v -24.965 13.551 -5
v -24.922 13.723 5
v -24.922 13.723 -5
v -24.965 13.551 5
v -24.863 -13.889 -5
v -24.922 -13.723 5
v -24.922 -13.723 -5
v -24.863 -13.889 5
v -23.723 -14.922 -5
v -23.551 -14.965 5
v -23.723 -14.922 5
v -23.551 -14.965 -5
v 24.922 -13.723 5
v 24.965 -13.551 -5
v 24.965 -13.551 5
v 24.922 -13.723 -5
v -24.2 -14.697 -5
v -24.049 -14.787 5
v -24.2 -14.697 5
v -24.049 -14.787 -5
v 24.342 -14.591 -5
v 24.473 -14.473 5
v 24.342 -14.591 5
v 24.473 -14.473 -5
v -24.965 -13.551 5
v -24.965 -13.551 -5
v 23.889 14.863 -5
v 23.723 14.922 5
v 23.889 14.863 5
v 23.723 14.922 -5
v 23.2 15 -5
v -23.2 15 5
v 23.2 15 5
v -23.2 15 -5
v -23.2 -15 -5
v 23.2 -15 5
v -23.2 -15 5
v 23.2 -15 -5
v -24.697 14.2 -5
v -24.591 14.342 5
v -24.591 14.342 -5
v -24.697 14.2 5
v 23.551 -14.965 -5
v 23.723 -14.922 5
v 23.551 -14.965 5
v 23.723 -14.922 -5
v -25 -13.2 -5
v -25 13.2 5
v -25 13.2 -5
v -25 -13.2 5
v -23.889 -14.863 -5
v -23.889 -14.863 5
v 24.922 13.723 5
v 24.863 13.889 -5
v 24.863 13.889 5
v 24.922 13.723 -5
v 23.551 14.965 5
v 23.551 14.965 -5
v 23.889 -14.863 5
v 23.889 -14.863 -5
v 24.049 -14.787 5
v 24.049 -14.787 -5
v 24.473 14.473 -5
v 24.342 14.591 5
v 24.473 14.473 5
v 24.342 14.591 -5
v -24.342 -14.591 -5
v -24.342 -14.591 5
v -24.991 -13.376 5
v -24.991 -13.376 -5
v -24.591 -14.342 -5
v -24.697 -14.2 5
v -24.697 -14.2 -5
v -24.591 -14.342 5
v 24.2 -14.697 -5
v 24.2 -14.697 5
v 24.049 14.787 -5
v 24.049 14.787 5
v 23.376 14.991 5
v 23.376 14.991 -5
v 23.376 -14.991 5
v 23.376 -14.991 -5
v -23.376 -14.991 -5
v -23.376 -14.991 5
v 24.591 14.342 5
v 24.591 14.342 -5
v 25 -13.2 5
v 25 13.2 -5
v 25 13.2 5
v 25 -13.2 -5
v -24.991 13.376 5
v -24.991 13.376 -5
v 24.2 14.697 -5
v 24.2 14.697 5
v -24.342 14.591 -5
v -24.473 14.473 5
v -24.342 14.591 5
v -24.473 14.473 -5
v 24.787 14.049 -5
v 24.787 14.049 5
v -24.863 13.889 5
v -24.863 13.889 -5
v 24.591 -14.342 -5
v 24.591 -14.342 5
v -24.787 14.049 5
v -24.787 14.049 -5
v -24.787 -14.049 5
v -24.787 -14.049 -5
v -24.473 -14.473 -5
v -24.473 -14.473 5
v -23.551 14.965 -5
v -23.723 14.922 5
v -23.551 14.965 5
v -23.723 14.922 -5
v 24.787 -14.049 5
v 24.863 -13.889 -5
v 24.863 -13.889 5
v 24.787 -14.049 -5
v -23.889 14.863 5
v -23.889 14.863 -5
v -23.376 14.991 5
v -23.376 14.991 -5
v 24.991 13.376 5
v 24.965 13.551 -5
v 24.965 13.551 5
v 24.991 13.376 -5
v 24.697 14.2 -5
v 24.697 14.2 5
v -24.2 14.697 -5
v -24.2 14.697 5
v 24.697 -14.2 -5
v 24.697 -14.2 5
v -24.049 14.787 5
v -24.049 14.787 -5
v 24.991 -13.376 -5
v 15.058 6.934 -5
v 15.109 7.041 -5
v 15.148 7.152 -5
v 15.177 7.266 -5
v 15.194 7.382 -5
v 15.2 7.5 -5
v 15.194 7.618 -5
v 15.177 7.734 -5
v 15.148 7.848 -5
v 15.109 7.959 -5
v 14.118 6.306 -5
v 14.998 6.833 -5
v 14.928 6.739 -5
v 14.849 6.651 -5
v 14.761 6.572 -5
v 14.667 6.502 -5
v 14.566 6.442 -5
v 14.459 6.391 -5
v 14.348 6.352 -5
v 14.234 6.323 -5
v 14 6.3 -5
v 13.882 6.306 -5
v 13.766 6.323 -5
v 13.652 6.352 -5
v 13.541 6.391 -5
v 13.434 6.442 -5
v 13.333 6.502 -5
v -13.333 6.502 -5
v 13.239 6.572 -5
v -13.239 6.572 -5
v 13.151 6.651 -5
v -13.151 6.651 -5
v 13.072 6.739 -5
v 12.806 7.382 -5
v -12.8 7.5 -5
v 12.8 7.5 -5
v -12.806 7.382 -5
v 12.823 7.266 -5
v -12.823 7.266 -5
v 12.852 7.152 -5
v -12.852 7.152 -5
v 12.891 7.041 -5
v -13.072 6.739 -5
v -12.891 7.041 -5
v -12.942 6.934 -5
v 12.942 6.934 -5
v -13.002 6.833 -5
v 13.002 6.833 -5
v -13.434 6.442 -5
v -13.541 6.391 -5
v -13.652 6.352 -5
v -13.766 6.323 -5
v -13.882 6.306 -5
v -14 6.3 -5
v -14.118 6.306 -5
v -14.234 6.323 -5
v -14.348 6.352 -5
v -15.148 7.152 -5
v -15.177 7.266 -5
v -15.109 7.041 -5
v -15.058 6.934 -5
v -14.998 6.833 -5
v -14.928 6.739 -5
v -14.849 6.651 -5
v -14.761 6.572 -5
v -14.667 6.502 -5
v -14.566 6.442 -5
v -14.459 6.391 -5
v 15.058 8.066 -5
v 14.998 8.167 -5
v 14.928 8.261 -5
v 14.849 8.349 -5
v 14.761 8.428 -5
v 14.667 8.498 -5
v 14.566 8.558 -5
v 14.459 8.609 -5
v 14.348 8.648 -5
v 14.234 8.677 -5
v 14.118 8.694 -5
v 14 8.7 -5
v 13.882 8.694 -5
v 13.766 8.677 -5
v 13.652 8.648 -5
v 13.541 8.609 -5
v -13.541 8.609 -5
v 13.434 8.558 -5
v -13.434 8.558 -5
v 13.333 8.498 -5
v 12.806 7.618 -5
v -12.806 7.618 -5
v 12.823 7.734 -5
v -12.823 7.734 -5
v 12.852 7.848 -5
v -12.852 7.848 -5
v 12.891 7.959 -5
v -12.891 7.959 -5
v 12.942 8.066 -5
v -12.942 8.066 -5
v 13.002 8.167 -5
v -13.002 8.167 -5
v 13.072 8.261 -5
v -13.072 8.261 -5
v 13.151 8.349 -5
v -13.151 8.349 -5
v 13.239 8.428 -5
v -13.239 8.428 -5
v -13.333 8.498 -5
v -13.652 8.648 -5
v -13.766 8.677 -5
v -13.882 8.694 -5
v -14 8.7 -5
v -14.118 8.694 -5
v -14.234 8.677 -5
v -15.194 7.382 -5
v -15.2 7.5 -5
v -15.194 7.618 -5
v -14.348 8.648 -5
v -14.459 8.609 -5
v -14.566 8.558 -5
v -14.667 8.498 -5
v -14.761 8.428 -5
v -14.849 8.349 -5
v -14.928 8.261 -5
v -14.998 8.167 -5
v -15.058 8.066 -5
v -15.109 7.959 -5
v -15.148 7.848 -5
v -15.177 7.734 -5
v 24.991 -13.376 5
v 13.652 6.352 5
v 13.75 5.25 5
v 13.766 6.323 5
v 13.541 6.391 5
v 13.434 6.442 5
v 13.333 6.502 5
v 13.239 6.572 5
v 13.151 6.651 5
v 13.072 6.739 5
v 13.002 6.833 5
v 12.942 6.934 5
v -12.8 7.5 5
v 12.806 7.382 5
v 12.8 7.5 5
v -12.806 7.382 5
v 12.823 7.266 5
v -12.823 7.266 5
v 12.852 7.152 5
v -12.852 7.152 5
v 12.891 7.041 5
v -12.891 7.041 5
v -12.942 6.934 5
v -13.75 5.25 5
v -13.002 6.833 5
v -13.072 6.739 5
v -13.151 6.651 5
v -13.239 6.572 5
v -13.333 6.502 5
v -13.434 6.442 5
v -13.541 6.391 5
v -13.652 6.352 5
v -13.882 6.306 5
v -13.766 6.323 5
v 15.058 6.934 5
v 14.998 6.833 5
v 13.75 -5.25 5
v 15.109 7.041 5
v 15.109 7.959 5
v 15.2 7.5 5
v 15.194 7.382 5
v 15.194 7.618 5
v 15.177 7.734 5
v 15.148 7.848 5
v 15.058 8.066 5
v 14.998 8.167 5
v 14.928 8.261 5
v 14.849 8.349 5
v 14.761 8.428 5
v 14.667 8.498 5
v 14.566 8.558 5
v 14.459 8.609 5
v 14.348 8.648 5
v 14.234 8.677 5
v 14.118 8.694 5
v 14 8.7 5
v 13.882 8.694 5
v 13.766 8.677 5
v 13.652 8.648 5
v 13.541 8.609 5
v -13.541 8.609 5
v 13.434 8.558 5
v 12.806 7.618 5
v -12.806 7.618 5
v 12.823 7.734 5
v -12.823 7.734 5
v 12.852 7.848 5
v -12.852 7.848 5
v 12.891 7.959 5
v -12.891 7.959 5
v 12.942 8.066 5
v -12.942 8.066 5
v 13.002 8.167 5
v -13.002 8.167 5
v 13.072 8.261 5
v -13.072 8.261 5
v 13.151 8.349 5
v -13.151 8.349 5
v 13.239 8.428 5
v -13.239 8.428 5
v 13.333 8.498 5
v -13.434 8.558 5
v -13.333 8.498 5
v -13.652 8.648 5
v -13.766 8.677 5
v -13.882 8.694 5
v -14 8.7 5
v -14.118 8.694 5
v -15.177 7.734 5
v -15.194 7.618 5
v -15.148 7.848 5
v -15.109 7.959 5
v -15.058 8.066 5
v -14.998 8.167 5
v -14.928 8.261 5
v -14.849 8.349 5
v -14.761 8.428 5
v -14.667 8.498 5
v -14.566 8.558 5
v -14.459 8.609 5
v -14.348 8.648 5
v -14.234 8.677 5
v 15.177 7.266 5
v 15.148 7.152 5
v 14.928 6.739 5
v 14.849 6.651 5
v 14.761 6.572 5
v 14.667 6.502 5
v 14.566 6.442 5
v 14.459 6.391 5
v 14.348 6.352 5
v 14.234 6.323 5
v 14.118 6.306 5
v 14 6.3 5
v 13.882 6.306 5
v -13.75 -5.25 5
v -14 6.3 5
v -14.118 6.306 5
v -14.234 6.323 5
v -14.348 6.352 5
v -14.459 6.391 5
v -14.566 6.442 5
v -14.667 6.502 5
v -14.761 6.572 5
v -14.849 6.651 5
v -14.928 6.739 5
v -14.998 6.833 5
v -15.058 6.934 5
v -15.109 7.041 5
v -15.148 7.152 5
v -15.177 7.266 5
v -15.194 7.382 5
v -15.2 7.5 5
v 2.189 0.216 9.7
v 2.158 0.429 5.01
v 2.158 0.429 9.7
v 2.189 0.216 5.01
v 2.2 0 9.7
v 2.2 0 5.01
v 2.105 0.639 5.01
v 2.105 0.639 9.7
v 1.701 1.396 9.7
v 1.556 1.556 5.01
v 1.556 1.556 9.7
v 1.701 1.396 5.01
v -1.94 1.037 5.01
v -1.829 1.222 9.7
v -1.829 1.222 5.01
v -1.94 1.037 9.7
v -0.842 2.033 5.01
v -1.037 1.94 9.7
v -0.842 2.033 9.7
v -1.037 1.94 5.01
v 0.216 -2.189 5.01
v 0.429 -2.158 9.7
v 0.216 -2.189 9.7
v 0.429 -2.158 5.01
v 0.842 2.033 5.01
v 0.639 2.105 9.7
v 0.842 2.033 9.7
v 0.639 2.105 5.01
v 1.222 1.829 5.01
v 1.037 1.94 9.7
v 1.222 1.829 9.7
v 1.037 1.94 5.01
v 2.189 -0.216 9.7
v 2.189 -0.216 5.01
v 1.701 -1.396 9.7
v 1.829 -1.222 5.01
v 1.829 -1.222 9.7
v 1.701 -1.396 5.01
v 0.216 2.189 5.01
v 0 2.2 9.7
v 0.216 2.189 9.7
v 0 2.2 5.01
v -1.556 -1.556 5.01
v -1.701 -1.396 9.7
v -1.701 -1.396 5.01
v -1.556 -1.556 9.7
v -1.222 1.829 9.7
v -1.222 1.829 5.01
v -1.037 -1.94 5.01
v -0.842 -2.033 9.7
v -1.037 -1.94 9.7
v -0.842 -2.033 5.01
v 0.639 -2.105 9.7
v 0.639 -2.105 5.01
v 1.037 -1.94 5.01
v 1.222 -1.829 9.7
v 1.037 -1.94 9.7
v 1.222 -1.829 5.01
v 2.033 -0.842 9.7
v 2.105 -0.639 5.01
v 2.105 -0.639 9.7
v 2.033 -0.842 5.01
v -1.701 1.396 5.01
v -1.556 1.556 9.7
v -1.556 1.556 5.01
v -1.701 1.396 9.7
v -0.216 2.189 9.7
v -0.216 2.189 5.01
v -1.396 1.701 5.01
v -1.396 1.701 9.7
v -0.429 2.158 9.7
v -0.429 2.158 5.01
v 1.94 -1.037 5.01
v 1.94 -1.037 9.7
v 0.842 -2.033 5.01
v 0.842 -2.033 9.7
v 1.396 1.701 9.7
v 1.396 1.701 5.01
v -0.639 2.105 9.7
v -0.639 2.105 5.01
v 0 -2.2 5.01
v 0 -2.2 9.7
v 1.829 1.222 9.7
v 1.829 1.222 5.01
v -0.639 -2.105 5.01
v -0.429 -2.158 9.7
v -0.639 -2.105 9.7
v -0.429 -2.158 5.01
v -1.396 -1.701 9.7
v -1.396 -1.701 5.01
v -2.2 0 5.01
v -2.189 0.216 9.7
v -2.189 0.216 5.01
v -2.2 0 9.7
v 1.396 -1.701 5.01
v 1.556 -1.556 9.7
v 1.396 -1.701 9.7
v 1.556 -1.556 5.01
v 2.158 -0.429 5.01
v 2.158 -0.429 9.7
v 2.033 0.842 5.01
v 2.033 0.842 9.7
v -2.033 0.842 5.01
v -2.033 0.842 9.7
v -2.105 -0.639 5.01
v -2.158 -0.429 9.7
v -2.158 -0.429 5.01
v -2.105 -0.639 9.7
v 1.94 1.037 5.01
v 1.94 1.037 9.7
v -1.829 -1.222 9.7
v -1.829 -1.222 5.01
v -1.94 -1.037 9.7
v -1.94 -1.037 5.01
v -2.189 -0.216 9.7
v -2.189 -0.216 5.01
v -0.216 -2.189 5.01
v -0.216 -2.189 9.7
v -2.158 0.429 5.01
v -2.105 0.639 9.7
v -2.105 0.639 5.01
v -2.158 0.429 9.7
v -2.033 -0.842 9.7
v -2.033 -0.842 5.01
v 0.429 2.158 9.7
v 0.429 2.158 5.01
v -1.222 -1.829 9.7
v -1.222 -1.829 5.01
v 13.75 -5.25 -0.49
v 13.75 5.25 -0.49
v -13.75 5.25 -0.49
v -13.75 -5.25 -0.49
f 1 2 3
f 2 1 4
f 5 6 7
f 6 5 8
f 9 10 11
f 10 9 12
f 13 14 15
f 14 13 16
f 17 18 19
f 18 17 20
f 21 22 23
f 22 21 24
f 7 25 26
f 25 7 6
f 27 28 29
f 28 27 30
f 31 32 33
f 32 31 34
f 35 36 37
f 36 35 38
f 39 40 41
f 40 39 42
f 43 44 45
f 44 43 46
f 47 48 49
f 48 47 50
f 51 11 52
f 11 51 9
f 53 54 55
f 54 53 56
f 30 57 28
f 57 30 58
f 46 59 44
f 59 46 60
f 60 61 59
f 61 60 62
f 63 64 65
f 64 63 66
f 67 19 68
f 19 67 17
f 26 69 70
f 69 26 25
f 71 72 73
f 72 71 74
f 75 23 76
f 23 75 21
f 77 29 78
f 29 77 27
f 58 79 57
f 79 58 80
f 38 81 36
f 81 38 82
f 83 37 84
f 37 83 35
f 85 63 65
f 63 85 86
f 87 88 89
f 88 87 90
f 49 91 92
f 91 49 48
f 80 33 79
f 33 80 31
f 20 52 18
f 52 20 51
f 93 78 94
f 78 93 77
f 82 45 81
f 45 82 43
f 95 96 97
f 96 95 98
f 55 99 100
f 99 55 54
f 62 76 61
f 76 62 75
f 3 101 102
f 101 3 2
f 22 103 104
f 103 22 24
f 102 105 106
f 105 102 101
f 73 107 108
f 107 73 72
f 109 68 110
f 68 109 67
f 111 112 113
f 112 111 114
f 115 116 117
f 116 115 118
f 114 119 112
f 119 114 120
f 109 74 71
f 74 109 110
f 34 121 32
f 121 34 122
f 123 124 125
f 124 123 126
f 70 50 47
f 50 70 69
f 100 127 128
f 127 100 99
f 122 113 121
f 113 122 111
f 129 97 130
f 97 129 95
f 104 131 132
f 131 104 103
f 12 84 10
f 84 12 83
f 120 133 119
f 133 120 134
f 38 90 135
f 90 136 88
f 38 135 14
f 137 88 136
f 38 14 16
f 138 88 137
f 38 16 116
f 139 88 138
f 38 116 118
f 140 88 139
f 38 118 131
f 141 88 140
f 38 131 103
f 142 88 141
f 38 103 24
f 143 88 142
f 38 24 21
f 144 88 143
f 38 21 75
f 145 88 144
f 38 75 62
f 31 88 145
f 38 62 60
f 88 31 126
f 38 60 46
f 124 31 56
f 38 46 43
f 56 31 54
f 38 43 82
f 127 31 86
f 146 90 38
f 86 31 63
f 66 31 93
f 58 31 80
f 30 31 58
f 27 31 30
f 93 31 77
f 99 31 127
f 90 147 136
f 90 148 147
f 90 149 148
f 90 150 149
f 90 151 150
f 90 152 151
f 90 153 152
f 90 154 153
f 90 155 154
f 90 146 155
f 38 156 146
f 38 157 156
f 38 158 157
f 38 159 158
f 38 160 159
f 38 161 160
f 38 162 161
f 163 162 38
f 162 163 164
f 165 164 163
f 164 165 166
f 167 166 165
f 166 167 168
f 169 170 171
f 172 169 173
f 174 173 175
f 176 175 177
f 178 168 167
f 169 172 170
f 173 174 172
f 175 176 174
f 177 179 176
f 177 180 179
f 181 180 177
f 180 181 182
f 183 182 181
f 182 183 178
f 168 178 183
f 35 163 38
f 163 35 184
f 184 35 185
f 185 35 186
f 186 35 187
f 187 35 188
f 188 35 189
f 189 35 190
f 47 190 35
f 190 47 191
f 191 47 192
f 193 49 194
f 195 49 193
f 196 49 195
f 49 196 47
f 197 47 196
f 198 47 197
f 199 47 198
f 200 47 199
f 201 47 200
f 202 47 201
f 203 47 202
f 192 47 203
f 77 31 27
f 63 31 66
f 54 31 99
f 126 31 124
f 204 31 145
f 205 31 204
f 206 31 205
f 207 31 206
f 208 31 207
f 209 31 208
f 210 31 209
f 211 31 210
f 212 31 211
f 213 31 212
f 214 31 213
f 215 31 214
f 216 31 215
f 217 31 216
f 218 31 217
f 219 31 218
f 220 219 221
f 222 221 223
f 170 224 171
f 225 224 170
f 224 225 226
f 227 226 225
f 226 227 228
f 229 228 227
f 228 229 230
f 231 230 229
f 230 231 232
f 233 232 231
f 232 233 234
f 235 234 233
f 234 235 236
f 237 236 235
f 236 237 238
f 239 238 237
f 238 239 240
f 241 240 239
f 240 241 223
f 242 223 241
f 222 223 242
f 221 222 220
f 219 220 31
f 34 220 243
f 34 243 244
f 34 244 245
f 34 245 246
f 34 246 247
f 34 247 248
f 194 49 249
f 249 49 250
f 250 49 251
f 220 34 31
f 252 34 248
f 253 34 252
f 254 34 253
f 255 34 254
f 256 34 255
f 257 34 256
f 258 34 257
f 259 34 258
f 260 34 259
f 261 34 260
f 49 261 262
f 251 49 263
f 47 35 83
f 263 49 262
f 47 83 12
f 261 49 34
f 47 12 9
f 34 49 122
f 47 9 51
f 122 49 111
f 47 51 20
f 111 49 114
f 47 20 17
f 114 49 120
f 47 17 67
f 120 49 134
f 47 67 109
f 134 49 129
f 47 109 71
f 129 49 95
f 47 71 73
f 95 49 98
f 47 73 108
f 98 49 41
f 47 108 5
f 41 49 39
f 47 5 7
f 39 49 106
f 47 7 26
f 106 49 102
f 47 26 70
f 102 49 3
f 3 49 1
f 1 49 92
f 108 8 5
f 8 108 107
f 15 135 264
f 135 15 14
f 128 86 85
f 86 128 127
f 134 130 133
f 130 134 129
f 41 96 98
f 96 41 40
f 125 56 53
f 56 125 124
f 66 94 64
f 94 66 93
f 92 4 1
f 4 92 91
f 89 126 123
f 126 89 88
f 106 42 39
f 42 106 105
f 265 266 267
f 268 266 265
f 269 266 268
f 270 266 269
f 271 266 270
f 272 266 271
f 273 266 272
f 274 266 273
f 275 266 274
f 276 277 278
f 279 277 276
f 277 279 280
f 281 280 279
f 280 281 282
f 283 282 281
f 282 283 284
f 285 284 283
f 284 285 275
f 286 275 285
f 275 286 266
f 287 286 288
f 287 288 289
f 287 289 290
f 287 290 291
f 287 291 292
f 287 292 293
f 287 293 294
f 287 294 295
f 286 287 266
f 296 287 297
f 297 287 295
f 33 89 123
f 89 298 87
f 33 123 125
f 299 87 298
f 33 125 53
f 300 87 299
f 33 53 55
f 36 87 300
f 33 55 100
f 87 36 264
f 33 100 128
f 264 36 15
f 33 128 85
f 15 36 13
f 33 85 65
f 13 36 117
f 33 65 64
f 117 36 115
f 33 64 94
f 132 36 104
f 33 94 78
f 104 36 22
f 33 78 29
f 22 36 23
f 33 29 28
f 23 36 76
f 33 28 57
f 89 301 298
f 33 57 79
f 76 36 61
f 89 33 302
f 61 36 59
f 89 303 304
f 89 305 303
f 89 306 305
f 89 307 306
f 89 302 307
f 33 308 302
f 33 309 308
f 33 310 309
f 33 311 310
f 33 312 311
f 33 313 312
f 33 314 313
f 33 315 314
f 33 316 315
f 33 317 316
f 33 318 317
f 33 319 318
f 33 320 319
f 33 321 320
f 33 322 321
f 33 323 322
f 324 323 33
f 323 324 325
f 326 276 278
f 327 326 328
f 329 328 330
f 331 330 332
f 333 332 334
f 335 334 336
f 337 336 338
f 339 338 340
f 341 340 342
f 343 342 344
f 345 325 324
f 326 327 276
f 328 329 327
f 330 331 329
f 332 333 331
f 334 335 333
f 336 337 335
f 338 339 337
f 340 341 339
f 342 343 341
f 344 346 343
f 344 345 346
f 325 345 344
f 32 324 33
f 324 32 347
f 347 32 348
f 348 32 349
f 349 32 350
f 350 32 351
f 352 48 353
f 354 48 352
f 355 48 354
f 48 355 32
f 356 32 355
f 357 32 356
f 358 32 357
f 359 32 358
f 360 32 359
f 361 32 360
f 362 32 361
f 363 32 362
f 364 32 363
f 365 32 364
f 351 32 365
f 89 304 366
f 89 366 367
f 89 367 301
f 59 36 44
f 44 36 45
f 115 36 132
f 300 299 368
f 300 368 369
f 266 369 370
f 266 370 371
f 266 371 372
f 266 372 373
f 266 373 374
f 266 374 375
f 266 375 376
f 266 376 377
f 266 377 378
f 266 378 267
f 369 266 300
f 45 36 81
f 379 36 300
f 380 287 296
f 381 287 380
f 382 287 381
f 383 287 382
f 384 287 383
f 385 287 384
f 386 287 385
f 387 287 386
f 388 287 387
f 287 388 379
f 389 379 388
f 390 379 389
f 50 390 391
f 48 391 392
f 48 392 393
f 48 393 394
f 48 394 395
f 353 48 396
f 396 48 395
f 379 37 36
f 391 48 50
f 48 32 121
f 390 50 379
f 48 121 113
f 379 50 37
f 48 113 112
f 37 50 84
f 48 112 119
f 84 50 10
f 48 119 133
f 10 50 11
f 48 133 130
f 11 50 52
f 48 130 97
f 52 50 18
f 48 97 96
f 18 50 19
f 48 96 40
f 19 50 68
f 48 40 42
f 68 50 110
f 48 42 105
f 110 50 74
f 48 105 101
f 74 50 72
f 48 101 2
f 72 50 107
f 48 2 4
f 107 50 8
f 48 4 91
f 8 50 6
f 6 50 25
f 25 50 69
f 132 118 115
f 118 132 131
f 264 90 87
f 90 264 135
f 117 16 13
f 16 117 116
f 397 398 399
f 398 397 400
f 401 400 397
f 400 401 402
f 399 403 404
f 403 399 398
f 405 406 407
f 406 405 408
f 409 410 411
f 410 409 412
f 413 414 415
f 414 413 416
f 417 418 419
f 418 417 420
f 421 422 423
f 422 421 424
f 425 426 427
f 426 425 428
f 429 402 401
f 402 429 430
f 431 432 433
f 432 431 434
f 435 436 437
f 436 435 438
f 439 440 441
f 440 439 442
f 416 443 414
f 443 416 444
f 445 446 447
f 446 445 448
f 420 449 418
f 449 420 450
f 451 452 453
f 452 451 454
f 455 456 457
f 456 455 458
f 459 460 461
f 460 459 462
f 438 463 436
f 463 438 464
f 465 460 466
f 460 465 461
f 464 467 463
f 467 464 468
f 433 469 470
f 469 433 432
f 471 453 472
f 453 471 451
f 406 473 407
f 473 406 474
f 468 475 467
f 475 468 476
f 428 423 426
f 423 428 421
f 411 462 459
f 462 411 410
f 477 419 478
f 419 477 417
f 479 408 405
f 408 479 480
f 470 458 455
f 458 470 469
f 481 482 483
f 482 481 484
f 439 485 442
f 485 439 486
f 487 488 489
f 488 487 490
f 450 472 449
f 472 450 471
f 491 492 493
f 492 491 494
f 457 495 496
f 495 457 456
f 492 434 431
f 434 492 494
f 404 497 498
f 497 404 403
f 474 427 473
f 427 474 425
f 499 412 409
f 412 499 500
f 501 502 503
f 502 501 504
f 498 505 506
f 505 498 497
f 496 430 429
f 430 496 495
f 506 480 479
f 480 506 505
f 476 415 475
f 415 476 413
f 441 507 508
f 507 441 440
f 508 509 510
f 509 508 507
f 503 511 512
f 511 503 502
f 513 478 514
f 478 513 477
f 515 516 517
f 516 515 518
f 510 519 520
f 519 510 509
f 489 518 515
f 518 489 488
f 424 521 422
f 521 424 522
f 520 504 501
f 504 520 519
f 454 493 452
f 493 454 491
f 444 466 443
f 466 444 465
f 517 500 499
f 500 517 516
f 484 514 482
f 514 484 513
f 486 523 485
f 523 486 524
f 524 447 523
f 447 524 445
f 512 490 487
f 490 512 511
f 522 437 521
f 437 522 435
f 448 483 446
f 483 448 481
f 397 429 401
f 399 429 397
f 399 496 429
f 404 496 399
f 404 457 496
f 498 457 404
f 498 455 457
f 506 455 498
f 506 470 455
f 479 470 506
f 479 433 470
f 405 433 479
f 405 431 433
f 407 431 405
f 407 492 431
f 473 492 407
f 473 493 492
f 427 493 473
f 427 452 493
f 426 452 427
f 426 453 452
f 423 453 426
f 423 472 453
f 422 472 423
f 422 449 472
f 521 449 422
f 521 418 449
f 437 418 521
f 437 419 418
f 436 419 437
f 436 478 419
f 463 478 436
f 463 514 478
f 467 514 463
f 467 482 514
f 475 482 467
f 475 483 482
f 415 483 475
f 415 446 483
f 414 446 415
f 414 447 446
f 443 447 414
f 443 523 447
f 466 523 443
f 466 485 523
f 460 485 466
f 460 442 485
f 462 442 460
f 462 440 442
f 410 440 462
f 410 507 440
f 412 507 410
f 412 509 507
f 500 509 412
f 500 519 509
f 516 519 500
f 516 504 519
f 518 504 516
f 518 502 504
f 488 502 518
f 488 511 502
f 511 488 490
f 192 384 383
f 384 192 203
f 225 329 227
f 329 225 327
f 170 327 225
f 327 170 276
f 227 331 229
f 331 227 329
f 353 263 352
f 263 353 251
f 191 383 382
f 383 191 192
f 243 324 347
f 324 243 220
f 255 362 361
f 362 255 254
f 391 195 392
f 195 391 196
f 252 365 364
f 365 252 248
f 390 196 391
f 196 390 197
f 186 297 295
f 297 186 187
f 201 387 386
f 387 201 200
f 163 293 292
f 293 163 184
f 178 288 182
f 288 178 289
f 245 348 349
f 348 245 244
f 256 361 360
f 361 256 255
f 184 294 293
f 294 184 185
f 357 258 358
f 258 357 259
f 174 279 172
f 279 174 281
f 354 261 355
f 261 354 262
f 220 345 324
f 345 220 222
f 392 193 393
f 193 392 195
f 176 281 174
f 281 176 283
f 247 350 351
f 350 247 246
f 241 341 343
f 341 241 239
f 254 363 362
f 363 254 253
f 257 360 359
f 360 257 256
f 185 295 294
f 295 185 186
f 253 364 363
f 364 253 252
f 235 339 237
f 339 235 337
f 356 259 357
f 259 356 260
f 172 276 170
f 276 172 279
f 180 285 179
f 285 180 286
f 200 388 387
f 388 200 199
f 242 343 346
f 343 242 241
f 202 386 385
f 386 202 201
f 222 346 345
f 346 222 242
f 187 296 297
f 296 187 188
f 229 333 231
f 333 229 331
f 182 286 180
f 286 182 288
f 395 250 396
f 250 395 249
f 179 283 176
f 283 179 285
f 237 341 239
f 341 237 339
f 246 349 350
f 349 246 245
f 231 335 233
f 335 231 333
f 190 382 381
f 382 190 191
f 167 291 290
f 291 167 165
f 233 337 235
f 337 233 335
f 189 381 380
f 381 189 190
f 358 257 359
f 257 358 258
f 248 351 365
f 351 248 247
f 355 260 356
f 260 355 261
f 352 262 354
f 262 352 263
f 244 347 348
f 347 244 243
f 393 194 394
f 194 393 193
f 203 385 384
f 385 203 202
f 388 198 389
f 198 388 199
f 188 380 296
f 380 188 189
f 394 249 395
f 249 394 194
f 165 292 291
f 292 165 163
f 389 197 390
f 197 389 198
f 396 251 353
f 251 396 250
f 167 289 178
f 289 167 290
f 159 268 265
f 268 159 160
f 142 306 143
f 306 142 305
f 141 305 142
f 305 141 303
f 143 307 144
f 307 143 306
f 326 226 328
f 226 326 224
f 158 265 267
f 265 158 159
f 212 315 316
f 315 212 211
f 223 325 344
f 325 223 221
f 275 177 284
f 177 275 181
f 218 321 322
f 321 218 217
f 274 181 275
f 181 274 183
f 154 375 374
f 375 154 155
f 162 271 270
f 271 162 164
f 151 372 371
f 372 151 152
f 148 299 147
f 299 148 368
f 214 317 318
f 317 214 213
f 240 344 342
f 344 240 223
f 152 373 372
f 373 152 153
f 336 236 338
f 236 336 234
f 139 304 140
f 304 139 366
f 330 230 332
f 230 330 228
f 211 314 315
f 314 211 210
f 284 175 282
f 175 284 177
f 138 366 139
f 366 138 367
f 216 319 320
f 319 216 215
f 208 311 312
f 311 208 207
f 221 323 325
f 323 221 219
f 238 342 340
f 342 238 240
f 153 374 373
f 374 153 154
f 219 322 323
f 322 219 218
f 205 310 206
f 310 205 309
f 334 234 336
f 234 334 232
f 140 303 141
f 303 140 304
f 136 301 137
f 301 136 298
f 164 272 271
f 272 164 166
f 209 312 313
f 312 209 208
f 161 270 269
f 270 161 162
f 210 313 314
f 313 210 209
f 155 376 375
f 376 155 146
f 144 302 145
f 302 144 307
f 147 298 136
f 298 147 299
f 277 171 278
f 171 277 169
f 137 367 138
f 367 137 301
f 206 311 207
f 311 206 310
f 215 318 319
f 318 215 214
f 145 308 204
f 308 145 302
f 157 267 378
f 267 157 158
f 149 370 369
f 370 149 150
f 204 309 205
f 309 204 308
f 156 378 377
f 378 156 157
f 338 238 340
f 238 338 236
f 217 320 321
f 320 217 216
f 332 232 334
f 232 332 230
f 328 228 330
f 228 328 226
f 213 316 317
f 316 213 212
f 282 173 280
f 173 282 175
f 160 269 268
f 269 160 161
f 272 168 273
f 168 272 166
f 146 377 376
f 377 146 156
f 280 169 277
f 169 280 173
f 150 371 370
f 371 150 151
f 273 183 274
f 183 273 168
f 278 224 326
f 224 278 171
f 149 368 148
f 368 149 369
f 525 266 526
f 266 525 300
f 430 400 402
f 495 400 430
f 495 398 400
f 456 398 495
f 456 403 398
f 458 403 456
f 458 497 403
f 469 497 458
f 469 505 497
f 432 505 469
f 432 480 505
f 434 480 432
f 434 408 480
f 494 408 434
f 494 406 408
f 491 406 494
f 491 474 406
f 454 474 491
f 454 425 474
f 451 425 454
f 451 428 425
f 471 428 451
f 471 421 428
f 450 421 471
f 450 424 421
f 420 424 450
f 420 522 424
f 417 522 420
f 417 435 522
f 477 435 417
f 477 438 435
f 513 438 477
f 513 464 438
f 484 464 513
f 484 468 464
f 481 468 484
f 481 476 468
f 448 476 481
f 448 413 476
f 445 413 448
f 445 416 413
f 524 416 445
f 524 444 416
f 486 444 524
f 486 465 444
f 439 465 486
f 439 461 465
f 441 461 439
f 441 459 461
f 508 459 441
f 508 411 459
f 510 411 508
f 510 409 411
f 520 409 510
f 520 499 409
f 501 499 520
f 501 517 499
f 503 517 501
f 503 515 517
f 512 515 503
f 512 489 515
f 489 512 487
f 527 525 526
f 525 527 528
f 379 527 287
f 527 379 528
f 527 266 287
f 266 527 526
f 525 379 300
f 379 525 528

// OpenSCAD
// Parameters
body_length = 50; //[25:100:1]
body_width  = 30; //[15:60:1]
body_height = 10; //[5:20:1]

$fn = 64;

// Feature parameters (derived from body dimensions)
corner_r   = min(body_width, body_height) * 0.18;
boss_r     = min(body_width, body_height) * 0.22;
boss_h     = body_height * 0.55;
boss_ovlp  = body_height * 0.08;   // overlap into body to ensure connectivity

slot_w     = body_width * 0.35;
slot_l     = body_length * 0.55;
slot_h     = body_height * 0.55;

hole_r     = min(body_width, body_height) * 0.12;
hole_x_off = body_length * 0.28;
hole_y_off = body_width  * 0.25;

// Rounded rectangular prism using hull of corner cylinders
module rounded_block(l, w, h, r) {
    r2 = min(r, min(l, w)/2 - 0.01);
    hull() {
        for (sx = [-1, 1], sy = [-1, 1])
            translate([sx*(l/2 - r2), sy*(w/2 - r2), 0])
                cylinder(r=r2, h=h, center=true);
    }
}

// Main component: rounded body + top boss, with slot and mounting holes
module component() {
    difference() {
        union() {
            // Main body
            rounded_block(body_length, body_width, body_height, corner_r);

            // Top boss (connected via calculated placement + overlap)
            translate([0, 0, body_height/2 + boss_h/2 - boss_ovlp])
                cylinder(r=boss_r, h=boss_h, center=true);
        }

        // Central top slot/pocket (does not cut through bottom)
        translate([0, 0, body_height/2 - slot_h/2 + 0.01])
            cube([slot_l, slot_w, slot_h], center=true);

        // Two through mounting holes
        for (sx = [-1, 1])
            translate([sx*hole_x_off, hole_y_off, 0])
                cylinder(r=hole_r, h=body_height + boss_h + 2, center=true);
    }
}

// Final Output (single connected solid)
component();
